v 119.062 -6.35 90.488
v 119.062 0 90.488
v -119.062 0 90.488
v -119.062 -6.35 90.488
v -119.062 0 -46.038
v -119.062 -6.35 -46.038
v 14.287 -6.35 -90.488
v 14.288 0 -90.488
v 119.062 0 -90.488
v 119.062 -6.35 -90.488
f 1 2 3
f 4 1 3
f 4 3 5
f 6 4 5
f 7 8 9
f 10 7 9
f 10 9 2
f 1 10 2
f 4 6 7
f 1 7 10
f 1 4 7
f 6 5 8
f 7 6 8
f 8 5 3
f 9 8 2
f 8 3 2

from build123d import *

# Parameters (mm, degrees)
F1_DEPTH = 6.35
F3_DEPTH = 25.4


with BuildPart() as f1:
    # F0 (on Front) → F1 (new body)
    with BuildSketch(Plane.XZ):
        with BuildLine():
            ThreePointArc((119.0625, 77.7875), (115.342756, 86.767756), (106.3625, 90.4875))
            Line((106.3625, 90.4875), (-106.3625, 90.4875))
            ThreePointArc((-106.3625, 90.4875), (-115.342756, 86.767756), (-119.0625, 77.7875))
            Line((-119.0625, 77.7875), (-119.0625, -77.7875))
            ThreePointArc((-119.0625, -77.7875), (-115.342756, -86.767756), (-106.3625, -90.4875))
            Line((-106.3625, -90.4875), (106.3625, -90.4875))
            ThreePointArc((106.3625, -90.4875), (115.342756, -86.767756), (119.0625, -77.7875))
            Line((119.0625, -77.7875), (119.0625, 77.7875))
        make_face()
        with BuildLine():
            Line((119.0625, 90.4875), (106.3625, 90.4875))
            ThreePointArc((106.3625, 90.4875), (115.342756, 86.767756), (119.0625, 77.7875))
            Line((119.0625, 77.7875), (119.0625, 90.4875))
        make_face()
        with BuildLine():
            ThreePointArc((-119.0625, 77.7875), (-115.342756, 86.767756), (-106.3625, 90.4875))
            Line((-106.3625, 90.4875), (-119.0625, 90.4875))
            Line((-119.0625, 90.4875), (-119.0625, 77.7875))
        make_face()
        with BuildLine():
            Line((119.0625, -90.4875), (119.0625, -77.7875))
            ThreePointArc((119.0625, -77.7875), (115.342756, -86.767756), (106.3625, -90.4875))
            Line((106.3625, -90.4875), (119.0625, -90.4875))
        make_face()
        with BuildLine():
            ThreePointArc((-106.3625, -90.4875), (-115.342756, -86.767756), (-119.0625, -77.7875))
            Line((-119.0625, -77.7875), (-119.0625, -90.4875))
            Line((-119.0625, -90.4875), (-106.3625, -90.4875))
        make_face()
    extrude(amount=F1_DEPTH)

    # F2 (on face) → F3 (cut)
    with BuildSketch(Plane(origin=(0, 0, 0), x_dir=(-1, 0, 0), z_dir=(0, 1, 0))):
        Polygon((-14.2875, -90.4875), (119.0625, -90.4875), (119.0625, -46.0375), align=None)
    extrude(amount=-F3_DEPTH, mode=Mode.SUBTRACT)


solid = f1.part
